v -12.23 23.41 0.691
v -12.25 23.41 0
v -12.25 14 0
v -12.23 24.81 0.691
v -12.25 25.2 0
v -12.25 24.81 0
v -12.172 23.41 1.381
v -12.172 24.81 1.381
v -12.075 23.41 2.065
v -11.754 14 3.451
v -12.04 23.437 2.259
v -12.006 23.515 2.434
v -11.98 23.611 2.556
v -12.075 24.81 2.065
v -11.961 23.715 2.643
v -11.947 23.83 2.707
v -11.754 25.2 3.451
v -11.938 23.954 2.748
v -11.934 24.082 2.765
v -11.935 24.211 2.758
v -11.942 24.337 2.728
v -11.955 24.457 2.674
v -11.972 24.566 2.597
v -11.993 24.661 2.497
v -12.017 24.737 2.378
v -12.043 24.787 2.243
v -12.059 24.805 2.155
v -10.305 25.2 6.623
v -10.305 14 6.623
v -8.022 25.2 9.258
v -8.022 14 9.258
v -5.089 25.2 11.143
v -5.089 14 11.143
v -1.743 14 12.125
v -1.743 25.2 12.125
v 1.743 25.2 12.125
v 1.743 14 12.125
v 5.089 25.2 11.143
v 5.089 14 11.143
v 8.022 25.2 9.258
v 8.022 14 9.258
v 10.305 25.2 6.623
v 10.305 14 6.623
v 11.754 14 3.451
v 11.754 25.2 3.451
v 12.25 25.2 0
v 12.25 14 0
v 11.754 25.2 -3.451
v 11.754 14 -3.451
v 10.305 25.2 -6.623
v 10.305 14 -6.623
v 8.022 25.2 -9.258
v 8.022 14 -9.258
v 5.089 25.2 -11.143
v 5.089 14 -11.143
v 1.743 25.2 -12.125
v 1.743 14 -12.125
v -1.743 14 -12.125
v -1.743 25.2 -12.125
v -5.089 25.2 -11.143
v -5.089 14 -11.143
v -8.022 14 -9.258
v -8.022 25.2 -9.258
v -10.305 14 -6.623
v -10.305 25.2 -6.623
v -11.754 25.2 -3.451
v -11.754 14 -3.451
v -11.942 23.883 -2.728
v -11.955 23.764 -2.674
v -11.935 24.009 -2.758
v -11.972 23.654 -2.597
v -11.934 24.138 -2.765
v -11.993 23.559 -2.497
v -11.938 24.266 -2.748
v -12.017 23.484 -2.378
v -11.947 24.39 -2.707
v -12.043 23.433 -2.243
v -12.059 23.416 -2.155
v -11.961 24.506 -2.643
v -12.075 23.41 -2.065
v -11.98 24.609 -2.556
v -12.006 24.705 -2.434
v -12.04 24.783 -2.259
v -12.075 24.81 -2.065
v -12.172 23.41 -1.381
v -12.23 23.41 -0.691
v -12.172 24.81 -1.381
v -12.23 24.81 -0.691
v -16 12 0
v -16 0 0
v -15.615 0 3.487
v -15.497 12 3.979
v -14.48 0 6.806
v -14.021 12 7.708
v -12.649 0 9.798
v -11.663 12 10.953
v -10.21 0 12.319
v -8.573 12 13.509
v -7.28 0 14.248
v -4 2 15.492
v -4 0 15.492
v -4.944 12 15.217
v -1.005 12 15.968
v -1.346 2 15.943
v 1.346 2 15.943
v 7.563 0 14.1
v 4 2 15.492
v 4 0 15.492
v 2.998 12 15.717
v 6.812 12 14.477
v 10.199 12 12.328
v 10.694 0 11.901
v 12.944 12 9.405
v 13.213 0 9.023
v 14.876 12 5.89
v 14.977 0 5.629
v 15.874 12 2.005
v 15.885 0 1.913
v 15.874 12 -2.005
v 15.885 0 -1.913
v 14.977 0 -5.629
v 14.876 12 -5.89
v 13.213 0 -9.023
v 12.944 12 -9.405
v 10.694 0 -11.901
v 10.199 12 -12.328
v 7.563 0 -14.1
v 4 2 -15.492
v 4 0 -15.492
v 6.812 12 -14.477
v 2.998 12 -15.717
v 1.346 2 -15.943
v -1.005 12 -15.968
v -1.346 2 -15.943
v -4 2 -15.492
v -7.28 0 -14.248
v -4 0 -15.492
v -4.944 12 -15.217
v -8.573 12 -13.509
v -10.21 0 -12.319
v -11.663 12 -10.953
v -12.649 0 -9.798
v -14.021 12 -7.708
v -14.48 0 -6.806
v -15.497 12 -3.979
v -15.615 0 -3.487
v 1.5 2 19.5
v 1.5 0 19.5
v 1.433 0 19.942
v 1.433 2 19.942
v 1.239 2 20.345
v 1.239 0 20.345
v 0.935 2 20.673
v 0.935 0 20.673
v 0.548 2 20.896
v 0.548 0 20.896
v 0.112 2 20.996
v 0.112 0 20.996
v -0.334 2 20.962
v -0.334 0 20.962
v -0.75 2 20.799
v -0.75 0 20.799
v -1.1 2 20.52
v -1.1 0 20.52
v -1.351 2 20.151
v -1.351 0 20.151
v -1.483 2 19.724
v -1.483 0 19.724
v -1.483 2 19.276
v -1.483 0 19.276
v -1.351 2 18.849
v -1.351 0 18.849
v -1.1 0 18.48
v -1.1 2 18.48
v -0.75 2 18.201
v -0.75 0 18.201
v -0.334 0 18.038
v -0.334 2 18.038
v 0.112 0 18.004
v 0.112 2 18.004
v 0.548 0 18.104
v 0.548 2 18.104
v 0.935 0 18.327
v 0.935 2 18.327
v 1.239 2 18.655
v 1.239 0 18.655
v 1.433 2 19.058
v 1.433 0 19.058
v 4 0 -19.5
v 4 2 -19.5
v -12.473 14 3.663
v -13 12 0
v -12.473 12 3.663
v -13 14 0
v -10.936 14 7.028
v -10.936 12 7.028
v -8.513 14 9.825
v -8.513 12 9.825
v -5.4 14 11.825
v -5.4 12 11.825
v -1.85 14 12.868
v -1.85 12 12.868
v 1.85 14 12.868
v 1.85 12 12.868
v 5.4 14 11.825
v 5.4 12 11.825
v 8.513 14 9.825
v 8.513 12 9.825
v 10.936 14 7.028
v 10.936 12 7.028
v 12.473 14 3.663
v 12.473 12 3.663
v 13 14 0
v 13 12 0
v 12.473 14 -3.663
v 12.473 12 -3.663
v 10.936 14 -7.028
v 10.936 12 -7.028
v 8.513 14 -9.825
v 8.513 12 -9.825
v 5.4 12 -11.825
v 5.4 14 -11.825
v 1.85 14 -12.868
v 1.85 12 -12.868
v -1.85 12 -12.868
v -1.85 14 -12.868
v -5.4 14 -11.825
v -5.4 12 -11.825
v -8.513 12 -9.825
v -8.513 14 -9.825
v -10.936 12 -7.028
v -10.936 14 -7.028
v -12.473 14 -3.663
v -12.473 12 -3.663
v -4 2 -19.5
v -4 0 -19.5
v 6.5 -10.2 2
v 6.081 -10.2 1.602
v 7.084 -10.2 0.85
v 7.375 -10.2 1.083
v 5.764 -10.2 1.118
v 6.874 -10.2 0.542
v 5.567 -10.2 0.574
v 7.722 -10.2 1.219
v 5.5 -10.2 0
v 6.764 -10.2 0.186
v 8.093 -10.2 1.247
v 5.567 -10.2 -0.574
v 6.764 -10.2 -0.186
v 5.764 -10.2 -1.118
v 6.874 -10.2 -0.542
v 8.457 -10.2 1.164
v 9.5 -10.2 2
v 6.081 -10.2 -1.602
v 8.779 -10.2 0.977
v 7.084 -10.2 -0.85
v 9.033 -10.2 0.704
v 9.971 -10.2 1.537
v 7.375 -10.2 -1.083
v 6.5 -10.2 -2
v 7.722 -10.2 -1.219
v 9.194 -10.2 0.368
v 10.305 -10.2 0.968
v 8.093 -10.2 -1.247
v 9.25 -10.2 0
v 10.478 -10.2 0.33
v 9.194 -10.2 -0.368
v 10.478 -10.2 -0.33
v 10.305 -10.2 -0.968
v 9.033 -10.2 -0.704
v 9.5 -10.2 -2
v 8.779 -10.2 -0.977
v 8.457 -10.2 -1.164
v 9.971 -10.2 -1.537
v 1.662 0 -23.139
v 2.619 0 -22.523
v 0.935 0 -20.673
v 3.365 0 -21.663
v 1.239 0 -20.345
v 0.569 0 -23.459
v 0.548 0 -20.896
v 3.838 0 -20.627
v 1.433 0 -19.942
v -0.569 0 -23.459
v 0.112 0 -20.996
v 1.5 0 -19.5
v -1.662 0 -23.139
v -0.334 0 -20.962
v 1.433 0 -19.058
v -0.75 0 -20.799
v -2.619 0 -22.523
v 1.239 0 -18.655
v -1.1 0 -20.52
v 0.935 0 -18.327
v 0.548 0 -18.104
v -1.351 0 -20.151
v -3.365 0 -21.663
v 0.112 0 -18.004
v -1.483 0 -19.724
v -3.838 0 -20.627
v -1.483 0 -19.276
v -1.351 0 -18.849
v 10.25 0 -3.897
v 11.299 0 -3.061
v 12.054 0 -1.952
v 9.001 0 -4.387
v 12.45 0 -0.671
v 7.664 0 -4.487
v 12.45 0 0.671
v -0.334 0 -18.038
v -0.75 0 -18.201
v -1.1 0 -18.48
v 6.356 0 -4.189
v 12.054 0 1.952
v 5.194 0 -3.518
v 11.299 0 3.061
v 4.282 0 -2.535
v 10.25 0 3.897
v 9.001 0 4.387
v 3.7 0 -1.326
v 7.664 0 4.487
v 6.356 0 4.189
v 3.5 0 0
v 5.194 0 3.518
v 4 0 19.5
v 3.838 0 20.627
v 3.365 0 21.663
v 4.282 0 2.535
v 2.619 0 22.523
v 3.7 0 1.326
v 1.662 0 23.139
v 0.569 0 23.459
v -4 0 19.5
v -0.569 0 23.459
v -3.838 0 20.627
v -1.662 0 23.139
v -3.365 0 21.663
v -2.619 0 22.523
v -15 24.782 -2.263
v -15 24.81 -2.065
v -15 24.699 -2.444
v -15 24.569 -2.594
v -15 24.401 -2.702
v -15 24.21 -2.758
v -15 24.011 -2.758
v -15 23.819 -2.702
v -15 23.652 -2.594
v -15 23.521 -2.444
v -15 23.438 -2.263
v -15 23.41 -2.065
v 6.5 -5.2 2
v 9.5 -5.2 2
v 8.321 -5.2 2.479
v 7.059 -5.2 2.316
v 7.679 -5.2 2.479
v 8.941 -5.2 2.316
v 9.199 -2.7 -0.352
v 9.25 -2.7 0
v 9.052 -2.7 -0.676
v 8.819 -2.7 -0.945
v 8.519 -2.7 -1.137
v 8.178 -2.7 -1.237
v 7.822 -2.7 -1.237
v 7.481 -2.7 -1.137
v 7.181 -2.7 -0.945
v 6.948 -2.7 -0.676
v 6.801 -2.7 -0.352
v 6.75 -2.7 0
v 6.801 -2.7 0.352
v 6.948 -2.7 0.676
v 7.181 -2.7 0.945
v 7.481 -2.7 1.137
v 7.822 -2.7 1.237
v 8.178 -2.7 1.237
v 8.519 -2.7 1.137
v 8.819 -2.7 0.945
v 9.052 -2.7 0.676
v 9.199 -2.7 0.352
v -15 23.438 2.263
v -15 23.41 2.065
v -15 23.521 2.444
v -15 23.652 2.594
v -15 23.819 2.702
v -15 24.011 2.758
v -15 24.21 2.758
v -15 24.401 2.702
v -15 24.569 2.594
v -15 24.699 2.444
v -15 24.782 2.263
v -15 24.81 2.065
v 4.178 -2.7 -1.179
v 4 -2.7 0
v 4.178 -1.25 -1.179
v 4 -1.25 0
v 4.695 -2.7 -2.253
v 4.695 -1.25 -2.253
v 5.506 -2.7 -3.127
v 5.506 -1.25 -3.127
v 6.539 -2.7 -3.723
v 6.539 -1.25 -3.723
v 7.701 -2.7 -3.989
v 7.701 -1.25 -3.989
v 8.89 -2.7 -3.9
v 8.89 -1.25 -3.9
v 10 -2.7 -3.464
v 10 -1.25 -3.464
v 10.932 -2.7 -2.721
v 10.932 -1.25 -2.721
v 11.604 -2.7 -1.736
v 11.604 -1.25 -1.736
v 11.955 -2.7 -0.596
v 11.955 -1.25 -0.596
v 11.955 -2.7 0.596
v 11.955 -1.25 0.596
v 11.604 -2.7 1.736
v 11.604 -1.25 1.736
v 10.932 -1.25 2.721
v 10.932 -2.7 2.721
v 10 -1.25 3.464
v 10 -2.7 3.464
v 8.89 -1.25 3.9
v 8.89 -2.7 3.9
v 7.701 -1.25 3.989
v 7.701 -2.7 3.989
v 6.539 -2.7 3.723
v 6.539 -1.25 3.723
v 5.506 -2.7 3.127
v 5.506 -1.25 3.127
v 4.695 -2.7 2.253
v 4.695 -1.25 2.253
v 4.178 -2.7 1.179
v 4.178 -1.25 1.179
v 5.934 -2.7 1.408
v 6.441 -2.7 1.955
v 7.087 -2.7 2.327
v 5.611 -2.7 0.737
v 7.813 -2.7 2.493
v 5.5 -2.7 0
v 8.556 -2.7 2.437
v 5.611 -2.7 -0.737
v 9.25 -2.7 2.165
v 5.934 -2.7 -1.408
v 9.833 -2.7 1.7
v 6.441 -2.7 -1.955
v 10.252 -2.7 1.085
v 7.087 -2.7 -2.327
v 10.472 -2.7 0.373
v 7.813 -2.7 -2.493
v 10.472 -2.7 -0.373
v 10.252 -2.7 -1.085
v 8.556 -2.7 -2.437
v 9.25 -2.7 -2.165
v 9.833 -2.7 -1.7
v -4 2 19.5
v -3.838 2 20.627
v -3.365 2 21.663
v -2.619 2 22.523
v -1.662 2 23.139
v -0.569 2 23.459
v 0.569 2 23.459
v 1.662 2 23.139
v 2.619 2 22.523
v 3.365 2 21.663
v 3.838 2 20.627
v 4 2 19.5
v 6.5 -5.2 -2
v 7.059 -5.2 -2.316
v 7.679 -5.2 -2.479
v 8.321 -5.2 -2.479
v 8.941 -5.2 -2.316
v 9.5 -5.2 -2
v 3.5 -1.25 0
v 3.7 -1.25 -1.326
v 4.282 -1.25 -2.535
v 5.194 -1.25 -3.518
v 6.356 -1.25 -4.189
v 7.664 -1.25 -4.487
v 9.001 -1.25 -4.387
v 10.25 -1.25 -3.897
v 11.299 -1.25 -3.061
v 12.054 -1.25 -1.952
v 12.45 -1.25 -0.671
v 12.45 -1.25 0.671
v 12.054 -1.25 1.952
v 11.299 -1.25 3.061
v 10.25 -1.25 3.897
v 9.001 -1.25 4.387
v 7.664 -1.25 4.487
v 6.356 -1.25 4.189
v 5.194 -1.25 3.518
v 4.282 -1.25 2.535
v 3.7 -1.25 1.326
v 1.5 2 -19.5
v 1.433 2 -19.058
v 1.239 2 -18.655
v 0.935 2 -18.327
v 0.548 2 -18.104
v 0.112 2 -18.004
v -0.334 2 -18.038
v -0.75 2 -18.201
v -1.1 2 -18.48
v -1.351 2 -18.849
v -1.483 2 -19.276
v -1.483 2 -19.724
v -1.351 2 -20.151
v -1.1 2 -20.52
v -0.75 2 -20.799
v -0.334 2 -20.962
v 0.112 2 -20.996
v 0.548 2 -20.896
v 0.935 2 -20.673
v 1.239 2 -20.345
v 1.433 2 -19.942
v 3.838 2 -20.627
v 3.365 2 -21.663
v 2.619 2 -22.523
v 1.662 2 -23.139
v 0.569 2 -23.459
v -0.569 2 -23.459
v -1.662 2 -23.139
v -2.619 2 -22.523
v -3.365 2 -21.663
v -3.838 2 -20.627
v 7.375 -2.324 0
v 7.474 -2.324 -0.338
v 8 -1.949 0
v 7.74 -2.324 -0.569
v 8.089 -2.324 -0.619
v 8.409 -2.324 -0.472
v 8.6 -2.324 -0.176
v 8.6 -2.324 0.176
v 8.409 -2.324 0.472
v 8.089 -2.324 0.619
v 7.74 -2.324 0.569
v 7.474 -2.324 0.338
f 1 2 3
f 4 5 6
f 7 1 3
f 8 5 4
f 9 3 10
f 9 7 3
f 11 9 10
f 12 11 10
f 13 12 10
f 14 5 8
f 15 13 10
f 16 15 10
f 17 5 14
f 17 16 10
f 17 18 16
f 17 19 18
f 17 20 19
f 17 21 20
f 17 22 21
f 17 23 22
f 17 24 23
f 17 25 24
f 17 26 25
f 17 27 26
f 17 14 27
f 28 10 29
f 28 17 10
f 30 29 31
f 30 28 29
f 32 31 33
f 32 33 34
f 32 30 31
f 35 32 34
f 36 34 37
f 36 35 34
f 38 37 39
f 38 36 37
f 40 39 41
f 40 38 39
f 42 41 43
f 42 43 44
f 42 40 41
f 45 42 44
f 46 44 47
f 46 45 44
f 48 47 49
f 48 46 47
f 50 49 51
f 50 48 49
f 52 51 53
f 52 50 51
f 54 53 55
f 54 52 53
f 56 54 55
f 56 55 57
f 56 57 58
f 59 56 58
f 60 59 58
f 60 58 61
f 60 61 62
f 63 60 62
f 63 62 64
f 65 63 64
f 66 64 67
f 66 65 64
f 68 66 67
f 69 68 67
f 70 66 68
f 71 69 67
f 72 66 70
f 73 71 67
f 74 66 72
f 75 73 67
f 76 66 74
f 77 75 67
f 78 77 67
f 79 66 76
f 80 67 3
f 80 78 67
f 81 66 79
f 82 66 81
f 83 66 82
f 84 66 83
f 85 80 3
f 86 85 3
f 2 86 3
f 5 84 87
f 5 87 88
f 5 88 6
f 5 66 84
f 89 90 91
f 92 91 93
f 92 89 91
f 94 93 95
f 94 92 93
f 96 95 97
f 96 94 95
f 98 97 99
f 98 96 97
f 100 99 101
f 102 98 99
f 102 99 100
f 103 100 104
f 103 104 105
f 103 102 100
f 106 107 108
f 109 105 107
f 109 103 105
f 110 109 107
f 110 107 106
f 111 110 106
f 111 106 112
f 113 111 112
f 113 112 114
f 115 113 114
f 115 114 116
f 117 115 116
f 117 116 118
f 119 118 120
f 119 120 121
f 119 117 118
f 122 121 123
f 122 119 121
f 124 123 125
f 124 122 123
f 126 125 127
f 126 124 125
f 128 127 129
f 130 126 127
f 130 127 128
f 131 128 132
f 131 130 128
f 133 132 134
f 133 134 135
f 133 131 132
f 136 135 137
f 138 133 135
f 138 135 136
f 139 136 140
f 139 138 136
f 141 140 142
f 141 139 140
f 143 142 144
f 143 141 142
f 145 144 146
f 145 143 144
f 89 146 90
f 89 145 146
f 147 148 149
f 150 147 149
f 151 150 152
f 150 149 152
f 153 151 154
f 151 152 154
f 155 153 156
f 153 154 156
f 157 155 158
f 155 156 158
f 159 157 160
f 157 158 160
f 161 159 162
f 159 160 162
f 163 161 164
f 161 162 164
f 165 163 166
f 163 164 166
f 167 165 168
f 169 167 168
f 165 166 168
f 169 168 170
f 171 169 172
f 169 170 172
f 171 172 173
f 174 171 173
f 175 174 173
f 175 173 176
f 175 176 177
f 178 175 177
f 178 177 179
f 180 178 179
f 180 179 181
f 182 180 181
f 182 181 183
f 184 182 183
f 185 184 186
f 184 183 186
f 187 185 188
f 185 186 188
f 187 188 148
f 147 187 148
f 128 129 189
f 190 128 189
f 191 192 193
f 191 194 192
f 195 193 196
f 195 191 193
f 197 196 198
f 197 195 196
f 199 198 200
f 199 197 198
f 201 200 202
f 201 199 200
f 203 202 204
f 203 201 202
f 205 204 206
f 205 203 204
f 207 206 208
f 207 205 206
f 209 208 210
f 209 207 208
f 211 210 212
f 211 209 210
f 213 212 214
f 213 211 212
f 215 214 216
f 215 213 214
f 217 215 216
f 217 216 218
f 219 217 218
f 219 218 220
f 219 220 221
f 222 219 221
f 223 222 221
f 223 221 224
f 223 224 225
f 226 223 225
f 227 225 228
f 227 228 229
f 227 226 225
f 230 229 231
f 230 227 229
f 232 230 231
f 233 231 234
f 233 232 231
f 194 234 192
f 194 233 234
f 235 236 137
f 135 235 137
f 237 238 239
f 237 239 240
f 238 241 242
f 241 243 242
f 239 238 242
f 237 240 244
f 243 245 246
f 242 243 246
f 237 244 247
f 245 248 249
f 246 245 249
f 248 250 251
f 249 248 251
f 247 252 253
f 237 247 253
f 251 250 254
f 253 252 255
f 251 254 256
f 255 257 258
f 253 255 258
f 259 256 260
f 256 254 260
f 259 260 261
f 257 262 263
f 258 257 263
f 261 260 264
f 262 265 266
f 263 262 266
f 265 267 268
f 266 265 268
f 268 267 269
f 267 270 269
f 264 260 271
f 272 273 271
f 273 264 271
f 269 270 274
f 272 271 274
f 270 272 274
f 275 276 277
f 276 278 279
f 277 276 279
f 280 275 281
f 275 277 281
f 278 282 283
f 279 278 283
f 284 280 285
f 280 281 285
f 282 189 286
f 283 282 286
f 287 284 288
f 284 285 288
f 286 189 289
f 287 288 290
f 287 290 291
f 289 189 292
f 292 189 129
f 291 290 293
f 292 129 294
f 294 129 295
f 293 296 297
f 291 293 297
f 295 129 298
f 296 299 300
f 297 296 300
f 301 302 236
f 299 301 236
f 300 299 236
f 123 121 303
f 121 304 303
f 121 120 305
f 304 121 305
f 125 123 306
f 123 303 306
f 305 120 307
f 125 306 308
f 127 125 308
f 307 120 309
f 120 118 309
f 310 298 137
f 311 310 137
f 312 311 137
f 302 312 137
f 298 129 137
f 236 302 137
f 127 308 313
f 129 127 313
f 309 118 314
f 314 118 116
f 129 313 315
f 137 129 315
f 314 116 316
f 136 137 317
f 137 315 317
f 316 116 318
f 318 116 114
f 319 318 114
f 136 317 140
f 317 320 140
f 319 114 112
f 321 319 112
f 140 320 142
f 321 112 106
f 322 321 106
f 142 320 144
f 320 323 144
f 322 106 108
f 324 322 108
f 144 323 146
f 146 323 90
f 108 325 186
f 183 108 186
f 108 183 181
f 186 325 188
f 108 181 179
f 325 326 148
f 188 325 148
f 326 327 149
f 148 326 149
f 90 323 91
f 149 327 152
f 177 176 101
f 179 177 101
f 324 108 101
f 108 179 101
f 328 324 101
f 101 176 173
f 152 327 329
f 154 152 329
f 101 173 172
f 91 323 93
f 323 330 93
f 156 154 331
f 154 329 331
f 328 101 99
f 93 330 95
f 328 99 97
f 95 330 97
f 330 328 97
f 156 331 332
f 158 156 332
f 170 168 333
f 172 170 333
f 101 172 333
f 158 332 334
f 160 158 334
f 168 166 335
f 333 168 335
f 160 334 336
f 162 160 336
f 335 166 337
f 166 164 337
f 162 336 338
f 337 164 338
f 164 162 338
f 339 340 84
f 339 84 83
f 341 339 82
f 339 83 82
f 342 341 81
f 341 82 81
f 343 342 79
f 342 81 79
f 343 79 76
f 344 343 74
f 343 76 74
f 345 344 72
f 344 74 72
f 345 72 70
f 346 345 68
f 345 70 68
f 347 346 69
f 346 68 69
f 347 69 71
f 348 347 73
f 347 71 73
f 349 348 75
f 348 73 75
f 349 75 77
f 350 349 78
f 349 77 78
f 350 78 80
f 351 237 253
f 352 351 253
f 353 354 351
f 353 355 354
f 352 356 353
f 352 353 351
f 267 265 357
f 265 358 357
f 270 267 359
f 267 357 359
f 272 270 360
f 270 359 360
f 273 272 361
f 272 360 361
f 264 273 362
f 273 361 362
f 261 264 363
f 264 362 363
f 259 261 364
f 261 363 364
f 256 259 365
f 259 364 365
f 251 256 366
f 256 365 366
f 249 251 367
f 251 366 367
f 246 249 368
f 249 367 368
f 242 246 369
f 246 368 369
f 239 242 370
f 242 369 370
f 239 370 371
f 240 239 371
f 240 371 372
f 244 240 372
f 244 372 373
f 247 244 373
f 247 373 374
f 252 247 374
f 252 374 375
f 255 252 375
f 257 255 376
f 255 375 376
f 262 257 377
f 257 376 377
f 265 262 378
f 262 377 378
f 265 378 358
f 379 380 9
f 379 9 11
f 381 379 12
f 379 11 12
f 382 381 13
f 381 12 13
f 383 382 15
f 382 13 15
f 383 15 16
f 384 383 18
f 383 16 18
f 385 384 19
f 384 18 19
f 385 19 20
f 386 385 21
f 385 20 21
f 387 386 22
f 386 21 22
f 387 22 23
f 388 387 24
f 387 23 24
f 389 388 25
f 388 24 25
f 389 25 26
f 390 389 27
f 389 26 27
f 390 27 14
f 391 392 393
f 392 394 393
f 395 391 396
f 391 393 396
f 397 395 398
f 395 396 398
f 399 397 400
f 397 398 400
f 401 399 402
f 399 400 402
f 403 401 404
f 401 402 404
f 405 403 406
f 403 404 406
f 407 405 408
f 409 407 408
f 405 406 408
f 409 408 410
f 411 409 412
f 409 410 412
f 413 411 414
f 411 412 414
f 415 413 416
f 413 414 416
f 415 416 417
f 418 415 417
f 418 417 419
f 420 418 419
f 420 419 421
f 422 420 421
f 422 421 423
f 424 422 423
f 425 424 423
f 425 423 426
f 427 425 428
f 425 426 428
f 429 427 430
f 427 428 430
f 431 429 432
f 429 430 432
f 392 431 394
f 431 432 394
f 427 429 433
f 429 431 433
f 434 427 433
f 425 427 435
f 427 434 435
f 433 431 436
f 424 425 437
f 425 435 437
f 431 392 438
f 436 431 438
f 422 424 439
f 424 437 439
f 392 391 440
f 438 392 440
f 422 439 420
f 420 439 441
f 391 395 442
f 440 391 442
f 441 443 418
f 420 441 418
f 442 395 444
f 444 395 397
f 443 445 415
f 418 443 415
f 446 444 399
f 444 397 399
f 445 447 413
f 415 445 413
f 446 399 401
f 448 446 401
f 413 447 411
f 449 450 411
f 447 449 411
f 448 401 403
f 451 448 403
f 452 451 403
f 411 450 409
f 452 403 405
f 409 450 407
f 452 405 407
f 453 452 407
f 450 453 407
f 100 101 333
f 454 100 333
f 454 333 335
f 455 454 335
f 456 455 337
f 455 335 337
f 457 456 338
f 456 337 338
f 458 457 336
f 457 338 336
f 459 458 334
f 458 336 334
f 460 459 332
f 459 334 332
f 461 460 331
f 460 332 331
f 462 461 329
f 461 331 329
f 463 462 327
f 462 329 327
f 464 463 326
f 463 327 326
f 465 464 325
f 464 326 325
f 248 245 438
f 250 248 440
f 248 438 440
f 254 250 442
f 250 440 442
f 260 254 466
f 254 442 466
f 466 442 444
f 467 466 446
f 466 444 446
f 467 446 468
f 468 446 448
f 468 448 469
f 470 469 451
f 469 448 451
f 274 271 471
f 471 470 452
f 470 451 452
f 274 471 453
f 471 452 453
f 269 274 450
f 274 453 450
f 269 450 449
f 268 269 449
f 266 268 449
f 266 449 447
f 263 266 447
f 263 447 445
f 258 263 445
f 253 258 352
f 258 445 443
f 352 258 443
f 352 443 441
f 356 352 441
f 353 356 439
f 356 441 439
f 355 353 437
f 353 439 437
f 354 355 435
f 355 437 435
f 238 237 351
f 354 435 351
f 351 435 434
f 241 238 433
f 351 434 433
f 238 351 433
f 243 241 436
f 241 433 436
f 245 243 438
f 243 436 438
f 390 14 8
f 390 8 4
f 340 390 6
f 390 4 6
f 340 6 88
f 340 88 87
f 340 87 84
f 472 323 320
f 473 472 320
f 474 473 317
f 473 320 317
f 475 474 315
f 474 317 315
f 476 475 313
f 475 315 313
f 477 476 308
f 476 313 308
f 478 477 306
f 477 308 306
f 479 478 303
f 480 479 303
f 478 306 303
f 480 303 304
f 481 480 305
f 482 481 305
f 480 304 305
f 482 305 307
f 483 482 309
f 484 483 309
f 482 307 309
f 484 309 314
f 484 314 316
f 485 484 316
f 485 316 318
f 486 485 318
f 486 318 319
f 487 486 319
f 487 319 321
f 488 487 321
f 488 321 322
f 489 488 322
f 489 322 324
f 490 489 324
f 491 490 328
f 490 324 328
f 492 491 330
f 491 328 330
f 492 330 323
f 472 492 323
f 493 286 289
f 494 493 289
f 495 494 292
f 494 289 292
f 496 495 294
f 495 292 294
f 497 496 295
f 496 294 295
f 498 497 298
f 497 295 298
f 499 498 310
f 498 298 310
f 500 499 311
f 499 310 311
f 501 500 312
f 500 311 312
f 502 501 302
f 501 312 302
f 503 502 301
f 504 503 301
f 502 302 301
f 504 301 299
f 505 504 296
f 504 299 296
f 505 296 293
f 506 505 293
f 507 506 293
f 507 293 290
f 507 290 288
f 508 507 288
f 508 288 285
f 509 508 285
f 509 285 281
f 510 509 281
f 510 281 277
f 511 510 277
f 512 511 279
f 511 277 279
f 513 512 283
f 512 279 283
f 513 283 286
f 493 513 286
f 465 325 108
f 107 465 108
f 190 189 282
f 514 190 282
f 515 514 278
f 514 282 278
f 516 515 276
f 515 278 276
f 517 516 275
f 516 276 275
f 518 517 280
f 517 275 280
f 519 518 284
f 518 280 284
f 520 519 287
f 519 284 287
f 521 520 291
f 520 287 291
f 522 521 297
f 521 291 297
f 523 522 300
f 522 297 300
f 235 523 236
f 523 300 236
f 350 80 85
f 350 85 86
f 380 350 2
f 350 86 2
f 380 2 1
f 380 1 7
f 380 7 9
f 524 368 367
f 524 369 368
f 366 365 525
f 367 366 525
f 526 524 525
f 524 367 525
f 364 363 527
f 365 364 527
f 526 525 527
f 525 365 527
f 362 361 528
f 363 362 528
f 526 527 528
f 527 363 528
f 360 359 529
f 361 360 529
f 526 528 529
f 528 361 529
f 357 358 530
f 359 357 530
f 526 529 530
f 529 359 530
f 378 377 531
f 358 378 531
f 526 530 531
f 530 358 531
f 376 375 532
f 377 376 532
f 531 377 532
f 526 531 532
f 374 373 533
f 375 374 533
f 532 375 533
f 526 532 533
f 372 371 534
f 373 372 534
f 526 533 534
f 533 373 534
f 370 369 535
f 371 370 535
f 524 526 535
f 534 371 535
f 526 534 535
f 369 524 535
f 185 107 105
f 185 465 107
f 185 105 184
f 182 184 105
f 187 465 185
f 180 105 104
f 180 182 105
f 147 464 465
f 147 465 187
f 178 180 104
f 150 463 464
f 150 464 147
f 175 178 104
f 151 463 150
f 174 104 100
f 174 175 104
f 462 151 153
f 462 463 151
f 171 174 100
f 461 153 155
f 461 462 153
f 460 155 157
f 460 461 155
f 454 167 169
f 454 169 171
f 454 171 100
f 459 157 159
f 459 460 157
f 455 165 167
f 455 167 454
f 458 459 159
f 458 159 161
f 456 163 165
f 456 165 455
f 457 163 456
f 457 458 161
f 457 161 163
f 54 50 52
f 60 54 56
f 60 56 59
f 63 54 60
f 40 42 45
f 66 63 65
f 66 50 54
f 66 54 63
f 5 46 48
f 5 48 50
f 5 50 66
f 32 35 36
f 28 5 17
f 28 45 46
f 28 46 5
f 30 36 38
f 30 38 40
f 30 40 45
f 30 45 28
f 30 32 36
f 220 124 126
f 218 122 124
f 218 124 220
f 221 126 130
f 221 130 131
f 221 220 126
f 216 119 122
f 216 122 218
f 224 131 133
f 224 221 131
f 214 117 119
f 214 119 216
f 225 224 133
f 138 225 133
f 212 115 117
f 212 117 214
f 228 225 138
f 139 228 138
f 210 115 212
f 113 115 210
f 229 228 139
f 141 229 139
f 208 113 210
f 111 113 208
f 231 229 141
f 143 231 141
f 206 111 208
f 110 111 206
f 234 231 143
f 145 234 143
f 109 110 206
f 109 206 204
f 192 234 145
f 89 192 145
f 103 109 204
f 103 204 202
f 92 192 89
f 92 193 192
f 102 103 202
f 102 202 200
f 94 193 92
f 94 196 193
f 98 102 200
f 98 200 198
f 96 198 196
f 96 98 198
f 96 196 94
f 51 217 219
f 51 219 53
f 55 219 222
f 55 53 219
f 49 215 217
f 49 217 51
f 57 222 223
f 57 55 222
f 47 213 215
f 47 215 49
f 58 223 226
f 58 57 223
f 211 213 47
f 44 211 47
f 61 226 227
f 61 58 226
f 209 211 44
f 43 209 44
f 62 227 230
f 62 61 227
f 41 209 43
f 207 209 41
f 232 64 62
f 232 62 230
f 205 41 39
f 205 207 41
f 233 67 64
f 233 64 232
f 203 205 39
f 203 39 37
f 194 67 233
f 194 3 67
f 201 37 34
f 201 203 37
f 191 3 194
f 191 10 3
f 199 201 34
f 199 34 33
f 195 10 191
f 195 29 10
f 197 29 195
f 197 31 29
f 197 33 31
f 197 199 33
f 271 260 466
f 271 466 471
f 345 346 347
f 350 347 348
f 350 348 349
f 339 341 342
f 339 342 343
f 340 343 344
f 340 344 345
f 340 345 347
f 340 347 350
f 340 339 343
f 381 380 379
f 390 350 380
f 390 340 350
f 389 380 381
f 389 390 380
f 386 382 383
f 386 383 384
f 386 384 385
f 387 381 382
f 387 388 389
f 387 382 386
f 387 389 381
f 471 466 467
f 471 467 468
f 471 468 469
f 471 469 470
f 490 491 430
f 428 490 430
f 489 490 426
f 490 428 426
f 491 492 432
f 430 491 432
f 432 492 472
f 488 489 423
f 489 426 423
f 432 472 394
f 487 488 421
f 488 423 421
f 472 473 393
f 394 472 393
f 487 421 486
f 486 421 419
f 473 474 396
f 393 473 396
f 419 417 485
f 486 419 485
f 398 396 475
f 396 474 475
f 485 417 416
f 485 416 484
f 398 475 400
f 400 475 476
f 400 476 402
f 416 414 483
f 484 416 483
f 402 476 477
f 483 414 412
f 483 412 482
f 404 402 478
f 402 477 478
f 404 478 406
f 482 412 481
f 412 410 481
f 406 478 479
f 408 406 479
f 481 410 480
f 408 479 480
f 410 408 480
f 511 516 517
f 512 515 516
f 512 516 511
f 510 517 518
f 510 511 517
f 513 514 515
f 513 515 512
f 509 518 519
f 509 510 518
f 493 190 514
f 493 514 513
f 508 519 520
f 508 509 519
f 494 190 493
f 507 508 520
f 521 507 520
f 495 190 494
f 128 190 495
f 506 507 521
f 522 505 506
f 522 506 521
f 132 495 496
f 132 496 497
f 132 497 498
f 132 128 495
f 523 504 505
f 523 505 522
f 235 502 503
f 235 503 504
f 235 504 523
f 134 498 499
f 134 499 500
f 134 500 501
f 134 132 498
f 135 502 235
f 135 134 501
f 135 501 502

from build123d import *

# Parameters (mm, degrees)
M3_TAPPED_HOLE1_D     = 2.5
M3_TAPPED_HOLE1_DEPTH = 7.5
M3_TAPPED_HOLE1_TIP   = 0.751075774
SKETCH5_W             = 11.224279957
SKETCH5_H             = 5.216918853
SKETCH5_W_2           = 10.939720747
SKETCH5_H_2           = 5.185301163
CUT_EXTRUDE1_DEPTH    = 5
SKETCH6_R             = 1.5
BOSS_EXTRUDE1_DEPTH   = 2
BOSS_EXTRUDE2_DEPTH   = 15


with BuildPart() as part:
    # Sketch1 → Revolve1 (revolve)
    with BuildSketch(Plane.XY):
        Polygon((0, 0), (-16, 0), (-16, 12), (-13, 12), (-13, 14), (-12.25, 14), (-12.25, 25.2), (0, 25.2), align=None)
    revolve(axis=Axis((0, 0, 0), (0, 1, 0)))

    # Sketch2 → Revolve2 (revolve)
    with BuildSketch(Plane.XY):
        Polygon((4, -2.7), (4, -1.25), (3.5, -1.25), (3.5, 0), (8, 0), (8, -10.2), (5.5, -10.2), (5.5, -2.7), align=None)
    revolve(axis=Axis((8, 0, 0), (0, -1, 0)))

    # M3 Tapped Hole1
    with Locations(Plane(origin=(0, -10.2, 0), x_dir=(-1, 0, 0), z_dir=(0, -1, 0))):
        with Locations((-8, 0)):
            Hole(M3_TAPPED_HOLE1_D / 2, depth=M3_TAPPED_HOLE1_DEPTH)
            with Locations((0, 0, -(M3_TAPPED_HOLE1_DEPTH + M3_TAPPED_HOLE1_TIP / 2))):  # 118° drill point
                Cone(0, M3_TAPPED_HOLE1_D / 2, M3_TAPPED_HOLE1_TIP, mode=Mode.SUBTRACT)

    # Sketch5 → Cut-Extrude1 (cut)
    with BuildSketch(Plane.XZ.offset(10.2)):
        with Locations((7.653051139, 4.608459426)):
            Rectangle(SKETCH5_W, SKETCH5_H)
        with Locations((7.795330744, -4.592650582)):
            Rectangle(SKETCH5_W_2, SKETCH5_H_2)
    extrude(amount=-CUT_EXTRUDE1_DEPTH, mode=Mode.SUBTRACT)

    # Sketch6 → Boss-Extrude1 (add)
    with BuildSketch(Plane.XZ):
        with BuildLine():
            Line((-4, -19.5), (-4, 19.5))
            ThreePointArc((-4, 19.5), (0, 23.5), (4, 19.5))
            Line((4, 19.5), (4, -19.5))
            ThreePointArc((4, -19.5), (0, -23.5), (-4, -19.5))
        make_face()
        with Locations((0, -19.5)):
            Circle(SKETCH6_R, mode=Mode.SUBTRACT)
        with Locations((0, 19.5)):
            Circle(SKETCH6_R, mode=Mode.SUBTRACT)
    extrude(amount=-BOSS_EXTRUDE1_DEPTH)

    # Sketch7 → Boss-Extrude2 (add)
    with BuildSketch(Plane(origin=(0, 0, 0), x_dir=(0, 0, -1), z_dir=(1, 0, 0))):
        with BuildLine():
            Line((-2.065333305, 24.81029355), (2.065333305, 24.81029355))
            ThreePointArc((2.065333305, 24.81029355), (2.76544629, 24.110180565), (2.065333305, 23.410067581))
            Line((2.065333305, 23.410067581), (-2.065333305, 23.410067581))
            ThreePointArc((-2.065333305, 23.410067581), (-2.76544629, 24.110180565), (-2.065333305, 24.81029355))
        make_face()
    extrude(amount=-BOSS_EXTRUDE2_DEPTH)


solid = part.part
